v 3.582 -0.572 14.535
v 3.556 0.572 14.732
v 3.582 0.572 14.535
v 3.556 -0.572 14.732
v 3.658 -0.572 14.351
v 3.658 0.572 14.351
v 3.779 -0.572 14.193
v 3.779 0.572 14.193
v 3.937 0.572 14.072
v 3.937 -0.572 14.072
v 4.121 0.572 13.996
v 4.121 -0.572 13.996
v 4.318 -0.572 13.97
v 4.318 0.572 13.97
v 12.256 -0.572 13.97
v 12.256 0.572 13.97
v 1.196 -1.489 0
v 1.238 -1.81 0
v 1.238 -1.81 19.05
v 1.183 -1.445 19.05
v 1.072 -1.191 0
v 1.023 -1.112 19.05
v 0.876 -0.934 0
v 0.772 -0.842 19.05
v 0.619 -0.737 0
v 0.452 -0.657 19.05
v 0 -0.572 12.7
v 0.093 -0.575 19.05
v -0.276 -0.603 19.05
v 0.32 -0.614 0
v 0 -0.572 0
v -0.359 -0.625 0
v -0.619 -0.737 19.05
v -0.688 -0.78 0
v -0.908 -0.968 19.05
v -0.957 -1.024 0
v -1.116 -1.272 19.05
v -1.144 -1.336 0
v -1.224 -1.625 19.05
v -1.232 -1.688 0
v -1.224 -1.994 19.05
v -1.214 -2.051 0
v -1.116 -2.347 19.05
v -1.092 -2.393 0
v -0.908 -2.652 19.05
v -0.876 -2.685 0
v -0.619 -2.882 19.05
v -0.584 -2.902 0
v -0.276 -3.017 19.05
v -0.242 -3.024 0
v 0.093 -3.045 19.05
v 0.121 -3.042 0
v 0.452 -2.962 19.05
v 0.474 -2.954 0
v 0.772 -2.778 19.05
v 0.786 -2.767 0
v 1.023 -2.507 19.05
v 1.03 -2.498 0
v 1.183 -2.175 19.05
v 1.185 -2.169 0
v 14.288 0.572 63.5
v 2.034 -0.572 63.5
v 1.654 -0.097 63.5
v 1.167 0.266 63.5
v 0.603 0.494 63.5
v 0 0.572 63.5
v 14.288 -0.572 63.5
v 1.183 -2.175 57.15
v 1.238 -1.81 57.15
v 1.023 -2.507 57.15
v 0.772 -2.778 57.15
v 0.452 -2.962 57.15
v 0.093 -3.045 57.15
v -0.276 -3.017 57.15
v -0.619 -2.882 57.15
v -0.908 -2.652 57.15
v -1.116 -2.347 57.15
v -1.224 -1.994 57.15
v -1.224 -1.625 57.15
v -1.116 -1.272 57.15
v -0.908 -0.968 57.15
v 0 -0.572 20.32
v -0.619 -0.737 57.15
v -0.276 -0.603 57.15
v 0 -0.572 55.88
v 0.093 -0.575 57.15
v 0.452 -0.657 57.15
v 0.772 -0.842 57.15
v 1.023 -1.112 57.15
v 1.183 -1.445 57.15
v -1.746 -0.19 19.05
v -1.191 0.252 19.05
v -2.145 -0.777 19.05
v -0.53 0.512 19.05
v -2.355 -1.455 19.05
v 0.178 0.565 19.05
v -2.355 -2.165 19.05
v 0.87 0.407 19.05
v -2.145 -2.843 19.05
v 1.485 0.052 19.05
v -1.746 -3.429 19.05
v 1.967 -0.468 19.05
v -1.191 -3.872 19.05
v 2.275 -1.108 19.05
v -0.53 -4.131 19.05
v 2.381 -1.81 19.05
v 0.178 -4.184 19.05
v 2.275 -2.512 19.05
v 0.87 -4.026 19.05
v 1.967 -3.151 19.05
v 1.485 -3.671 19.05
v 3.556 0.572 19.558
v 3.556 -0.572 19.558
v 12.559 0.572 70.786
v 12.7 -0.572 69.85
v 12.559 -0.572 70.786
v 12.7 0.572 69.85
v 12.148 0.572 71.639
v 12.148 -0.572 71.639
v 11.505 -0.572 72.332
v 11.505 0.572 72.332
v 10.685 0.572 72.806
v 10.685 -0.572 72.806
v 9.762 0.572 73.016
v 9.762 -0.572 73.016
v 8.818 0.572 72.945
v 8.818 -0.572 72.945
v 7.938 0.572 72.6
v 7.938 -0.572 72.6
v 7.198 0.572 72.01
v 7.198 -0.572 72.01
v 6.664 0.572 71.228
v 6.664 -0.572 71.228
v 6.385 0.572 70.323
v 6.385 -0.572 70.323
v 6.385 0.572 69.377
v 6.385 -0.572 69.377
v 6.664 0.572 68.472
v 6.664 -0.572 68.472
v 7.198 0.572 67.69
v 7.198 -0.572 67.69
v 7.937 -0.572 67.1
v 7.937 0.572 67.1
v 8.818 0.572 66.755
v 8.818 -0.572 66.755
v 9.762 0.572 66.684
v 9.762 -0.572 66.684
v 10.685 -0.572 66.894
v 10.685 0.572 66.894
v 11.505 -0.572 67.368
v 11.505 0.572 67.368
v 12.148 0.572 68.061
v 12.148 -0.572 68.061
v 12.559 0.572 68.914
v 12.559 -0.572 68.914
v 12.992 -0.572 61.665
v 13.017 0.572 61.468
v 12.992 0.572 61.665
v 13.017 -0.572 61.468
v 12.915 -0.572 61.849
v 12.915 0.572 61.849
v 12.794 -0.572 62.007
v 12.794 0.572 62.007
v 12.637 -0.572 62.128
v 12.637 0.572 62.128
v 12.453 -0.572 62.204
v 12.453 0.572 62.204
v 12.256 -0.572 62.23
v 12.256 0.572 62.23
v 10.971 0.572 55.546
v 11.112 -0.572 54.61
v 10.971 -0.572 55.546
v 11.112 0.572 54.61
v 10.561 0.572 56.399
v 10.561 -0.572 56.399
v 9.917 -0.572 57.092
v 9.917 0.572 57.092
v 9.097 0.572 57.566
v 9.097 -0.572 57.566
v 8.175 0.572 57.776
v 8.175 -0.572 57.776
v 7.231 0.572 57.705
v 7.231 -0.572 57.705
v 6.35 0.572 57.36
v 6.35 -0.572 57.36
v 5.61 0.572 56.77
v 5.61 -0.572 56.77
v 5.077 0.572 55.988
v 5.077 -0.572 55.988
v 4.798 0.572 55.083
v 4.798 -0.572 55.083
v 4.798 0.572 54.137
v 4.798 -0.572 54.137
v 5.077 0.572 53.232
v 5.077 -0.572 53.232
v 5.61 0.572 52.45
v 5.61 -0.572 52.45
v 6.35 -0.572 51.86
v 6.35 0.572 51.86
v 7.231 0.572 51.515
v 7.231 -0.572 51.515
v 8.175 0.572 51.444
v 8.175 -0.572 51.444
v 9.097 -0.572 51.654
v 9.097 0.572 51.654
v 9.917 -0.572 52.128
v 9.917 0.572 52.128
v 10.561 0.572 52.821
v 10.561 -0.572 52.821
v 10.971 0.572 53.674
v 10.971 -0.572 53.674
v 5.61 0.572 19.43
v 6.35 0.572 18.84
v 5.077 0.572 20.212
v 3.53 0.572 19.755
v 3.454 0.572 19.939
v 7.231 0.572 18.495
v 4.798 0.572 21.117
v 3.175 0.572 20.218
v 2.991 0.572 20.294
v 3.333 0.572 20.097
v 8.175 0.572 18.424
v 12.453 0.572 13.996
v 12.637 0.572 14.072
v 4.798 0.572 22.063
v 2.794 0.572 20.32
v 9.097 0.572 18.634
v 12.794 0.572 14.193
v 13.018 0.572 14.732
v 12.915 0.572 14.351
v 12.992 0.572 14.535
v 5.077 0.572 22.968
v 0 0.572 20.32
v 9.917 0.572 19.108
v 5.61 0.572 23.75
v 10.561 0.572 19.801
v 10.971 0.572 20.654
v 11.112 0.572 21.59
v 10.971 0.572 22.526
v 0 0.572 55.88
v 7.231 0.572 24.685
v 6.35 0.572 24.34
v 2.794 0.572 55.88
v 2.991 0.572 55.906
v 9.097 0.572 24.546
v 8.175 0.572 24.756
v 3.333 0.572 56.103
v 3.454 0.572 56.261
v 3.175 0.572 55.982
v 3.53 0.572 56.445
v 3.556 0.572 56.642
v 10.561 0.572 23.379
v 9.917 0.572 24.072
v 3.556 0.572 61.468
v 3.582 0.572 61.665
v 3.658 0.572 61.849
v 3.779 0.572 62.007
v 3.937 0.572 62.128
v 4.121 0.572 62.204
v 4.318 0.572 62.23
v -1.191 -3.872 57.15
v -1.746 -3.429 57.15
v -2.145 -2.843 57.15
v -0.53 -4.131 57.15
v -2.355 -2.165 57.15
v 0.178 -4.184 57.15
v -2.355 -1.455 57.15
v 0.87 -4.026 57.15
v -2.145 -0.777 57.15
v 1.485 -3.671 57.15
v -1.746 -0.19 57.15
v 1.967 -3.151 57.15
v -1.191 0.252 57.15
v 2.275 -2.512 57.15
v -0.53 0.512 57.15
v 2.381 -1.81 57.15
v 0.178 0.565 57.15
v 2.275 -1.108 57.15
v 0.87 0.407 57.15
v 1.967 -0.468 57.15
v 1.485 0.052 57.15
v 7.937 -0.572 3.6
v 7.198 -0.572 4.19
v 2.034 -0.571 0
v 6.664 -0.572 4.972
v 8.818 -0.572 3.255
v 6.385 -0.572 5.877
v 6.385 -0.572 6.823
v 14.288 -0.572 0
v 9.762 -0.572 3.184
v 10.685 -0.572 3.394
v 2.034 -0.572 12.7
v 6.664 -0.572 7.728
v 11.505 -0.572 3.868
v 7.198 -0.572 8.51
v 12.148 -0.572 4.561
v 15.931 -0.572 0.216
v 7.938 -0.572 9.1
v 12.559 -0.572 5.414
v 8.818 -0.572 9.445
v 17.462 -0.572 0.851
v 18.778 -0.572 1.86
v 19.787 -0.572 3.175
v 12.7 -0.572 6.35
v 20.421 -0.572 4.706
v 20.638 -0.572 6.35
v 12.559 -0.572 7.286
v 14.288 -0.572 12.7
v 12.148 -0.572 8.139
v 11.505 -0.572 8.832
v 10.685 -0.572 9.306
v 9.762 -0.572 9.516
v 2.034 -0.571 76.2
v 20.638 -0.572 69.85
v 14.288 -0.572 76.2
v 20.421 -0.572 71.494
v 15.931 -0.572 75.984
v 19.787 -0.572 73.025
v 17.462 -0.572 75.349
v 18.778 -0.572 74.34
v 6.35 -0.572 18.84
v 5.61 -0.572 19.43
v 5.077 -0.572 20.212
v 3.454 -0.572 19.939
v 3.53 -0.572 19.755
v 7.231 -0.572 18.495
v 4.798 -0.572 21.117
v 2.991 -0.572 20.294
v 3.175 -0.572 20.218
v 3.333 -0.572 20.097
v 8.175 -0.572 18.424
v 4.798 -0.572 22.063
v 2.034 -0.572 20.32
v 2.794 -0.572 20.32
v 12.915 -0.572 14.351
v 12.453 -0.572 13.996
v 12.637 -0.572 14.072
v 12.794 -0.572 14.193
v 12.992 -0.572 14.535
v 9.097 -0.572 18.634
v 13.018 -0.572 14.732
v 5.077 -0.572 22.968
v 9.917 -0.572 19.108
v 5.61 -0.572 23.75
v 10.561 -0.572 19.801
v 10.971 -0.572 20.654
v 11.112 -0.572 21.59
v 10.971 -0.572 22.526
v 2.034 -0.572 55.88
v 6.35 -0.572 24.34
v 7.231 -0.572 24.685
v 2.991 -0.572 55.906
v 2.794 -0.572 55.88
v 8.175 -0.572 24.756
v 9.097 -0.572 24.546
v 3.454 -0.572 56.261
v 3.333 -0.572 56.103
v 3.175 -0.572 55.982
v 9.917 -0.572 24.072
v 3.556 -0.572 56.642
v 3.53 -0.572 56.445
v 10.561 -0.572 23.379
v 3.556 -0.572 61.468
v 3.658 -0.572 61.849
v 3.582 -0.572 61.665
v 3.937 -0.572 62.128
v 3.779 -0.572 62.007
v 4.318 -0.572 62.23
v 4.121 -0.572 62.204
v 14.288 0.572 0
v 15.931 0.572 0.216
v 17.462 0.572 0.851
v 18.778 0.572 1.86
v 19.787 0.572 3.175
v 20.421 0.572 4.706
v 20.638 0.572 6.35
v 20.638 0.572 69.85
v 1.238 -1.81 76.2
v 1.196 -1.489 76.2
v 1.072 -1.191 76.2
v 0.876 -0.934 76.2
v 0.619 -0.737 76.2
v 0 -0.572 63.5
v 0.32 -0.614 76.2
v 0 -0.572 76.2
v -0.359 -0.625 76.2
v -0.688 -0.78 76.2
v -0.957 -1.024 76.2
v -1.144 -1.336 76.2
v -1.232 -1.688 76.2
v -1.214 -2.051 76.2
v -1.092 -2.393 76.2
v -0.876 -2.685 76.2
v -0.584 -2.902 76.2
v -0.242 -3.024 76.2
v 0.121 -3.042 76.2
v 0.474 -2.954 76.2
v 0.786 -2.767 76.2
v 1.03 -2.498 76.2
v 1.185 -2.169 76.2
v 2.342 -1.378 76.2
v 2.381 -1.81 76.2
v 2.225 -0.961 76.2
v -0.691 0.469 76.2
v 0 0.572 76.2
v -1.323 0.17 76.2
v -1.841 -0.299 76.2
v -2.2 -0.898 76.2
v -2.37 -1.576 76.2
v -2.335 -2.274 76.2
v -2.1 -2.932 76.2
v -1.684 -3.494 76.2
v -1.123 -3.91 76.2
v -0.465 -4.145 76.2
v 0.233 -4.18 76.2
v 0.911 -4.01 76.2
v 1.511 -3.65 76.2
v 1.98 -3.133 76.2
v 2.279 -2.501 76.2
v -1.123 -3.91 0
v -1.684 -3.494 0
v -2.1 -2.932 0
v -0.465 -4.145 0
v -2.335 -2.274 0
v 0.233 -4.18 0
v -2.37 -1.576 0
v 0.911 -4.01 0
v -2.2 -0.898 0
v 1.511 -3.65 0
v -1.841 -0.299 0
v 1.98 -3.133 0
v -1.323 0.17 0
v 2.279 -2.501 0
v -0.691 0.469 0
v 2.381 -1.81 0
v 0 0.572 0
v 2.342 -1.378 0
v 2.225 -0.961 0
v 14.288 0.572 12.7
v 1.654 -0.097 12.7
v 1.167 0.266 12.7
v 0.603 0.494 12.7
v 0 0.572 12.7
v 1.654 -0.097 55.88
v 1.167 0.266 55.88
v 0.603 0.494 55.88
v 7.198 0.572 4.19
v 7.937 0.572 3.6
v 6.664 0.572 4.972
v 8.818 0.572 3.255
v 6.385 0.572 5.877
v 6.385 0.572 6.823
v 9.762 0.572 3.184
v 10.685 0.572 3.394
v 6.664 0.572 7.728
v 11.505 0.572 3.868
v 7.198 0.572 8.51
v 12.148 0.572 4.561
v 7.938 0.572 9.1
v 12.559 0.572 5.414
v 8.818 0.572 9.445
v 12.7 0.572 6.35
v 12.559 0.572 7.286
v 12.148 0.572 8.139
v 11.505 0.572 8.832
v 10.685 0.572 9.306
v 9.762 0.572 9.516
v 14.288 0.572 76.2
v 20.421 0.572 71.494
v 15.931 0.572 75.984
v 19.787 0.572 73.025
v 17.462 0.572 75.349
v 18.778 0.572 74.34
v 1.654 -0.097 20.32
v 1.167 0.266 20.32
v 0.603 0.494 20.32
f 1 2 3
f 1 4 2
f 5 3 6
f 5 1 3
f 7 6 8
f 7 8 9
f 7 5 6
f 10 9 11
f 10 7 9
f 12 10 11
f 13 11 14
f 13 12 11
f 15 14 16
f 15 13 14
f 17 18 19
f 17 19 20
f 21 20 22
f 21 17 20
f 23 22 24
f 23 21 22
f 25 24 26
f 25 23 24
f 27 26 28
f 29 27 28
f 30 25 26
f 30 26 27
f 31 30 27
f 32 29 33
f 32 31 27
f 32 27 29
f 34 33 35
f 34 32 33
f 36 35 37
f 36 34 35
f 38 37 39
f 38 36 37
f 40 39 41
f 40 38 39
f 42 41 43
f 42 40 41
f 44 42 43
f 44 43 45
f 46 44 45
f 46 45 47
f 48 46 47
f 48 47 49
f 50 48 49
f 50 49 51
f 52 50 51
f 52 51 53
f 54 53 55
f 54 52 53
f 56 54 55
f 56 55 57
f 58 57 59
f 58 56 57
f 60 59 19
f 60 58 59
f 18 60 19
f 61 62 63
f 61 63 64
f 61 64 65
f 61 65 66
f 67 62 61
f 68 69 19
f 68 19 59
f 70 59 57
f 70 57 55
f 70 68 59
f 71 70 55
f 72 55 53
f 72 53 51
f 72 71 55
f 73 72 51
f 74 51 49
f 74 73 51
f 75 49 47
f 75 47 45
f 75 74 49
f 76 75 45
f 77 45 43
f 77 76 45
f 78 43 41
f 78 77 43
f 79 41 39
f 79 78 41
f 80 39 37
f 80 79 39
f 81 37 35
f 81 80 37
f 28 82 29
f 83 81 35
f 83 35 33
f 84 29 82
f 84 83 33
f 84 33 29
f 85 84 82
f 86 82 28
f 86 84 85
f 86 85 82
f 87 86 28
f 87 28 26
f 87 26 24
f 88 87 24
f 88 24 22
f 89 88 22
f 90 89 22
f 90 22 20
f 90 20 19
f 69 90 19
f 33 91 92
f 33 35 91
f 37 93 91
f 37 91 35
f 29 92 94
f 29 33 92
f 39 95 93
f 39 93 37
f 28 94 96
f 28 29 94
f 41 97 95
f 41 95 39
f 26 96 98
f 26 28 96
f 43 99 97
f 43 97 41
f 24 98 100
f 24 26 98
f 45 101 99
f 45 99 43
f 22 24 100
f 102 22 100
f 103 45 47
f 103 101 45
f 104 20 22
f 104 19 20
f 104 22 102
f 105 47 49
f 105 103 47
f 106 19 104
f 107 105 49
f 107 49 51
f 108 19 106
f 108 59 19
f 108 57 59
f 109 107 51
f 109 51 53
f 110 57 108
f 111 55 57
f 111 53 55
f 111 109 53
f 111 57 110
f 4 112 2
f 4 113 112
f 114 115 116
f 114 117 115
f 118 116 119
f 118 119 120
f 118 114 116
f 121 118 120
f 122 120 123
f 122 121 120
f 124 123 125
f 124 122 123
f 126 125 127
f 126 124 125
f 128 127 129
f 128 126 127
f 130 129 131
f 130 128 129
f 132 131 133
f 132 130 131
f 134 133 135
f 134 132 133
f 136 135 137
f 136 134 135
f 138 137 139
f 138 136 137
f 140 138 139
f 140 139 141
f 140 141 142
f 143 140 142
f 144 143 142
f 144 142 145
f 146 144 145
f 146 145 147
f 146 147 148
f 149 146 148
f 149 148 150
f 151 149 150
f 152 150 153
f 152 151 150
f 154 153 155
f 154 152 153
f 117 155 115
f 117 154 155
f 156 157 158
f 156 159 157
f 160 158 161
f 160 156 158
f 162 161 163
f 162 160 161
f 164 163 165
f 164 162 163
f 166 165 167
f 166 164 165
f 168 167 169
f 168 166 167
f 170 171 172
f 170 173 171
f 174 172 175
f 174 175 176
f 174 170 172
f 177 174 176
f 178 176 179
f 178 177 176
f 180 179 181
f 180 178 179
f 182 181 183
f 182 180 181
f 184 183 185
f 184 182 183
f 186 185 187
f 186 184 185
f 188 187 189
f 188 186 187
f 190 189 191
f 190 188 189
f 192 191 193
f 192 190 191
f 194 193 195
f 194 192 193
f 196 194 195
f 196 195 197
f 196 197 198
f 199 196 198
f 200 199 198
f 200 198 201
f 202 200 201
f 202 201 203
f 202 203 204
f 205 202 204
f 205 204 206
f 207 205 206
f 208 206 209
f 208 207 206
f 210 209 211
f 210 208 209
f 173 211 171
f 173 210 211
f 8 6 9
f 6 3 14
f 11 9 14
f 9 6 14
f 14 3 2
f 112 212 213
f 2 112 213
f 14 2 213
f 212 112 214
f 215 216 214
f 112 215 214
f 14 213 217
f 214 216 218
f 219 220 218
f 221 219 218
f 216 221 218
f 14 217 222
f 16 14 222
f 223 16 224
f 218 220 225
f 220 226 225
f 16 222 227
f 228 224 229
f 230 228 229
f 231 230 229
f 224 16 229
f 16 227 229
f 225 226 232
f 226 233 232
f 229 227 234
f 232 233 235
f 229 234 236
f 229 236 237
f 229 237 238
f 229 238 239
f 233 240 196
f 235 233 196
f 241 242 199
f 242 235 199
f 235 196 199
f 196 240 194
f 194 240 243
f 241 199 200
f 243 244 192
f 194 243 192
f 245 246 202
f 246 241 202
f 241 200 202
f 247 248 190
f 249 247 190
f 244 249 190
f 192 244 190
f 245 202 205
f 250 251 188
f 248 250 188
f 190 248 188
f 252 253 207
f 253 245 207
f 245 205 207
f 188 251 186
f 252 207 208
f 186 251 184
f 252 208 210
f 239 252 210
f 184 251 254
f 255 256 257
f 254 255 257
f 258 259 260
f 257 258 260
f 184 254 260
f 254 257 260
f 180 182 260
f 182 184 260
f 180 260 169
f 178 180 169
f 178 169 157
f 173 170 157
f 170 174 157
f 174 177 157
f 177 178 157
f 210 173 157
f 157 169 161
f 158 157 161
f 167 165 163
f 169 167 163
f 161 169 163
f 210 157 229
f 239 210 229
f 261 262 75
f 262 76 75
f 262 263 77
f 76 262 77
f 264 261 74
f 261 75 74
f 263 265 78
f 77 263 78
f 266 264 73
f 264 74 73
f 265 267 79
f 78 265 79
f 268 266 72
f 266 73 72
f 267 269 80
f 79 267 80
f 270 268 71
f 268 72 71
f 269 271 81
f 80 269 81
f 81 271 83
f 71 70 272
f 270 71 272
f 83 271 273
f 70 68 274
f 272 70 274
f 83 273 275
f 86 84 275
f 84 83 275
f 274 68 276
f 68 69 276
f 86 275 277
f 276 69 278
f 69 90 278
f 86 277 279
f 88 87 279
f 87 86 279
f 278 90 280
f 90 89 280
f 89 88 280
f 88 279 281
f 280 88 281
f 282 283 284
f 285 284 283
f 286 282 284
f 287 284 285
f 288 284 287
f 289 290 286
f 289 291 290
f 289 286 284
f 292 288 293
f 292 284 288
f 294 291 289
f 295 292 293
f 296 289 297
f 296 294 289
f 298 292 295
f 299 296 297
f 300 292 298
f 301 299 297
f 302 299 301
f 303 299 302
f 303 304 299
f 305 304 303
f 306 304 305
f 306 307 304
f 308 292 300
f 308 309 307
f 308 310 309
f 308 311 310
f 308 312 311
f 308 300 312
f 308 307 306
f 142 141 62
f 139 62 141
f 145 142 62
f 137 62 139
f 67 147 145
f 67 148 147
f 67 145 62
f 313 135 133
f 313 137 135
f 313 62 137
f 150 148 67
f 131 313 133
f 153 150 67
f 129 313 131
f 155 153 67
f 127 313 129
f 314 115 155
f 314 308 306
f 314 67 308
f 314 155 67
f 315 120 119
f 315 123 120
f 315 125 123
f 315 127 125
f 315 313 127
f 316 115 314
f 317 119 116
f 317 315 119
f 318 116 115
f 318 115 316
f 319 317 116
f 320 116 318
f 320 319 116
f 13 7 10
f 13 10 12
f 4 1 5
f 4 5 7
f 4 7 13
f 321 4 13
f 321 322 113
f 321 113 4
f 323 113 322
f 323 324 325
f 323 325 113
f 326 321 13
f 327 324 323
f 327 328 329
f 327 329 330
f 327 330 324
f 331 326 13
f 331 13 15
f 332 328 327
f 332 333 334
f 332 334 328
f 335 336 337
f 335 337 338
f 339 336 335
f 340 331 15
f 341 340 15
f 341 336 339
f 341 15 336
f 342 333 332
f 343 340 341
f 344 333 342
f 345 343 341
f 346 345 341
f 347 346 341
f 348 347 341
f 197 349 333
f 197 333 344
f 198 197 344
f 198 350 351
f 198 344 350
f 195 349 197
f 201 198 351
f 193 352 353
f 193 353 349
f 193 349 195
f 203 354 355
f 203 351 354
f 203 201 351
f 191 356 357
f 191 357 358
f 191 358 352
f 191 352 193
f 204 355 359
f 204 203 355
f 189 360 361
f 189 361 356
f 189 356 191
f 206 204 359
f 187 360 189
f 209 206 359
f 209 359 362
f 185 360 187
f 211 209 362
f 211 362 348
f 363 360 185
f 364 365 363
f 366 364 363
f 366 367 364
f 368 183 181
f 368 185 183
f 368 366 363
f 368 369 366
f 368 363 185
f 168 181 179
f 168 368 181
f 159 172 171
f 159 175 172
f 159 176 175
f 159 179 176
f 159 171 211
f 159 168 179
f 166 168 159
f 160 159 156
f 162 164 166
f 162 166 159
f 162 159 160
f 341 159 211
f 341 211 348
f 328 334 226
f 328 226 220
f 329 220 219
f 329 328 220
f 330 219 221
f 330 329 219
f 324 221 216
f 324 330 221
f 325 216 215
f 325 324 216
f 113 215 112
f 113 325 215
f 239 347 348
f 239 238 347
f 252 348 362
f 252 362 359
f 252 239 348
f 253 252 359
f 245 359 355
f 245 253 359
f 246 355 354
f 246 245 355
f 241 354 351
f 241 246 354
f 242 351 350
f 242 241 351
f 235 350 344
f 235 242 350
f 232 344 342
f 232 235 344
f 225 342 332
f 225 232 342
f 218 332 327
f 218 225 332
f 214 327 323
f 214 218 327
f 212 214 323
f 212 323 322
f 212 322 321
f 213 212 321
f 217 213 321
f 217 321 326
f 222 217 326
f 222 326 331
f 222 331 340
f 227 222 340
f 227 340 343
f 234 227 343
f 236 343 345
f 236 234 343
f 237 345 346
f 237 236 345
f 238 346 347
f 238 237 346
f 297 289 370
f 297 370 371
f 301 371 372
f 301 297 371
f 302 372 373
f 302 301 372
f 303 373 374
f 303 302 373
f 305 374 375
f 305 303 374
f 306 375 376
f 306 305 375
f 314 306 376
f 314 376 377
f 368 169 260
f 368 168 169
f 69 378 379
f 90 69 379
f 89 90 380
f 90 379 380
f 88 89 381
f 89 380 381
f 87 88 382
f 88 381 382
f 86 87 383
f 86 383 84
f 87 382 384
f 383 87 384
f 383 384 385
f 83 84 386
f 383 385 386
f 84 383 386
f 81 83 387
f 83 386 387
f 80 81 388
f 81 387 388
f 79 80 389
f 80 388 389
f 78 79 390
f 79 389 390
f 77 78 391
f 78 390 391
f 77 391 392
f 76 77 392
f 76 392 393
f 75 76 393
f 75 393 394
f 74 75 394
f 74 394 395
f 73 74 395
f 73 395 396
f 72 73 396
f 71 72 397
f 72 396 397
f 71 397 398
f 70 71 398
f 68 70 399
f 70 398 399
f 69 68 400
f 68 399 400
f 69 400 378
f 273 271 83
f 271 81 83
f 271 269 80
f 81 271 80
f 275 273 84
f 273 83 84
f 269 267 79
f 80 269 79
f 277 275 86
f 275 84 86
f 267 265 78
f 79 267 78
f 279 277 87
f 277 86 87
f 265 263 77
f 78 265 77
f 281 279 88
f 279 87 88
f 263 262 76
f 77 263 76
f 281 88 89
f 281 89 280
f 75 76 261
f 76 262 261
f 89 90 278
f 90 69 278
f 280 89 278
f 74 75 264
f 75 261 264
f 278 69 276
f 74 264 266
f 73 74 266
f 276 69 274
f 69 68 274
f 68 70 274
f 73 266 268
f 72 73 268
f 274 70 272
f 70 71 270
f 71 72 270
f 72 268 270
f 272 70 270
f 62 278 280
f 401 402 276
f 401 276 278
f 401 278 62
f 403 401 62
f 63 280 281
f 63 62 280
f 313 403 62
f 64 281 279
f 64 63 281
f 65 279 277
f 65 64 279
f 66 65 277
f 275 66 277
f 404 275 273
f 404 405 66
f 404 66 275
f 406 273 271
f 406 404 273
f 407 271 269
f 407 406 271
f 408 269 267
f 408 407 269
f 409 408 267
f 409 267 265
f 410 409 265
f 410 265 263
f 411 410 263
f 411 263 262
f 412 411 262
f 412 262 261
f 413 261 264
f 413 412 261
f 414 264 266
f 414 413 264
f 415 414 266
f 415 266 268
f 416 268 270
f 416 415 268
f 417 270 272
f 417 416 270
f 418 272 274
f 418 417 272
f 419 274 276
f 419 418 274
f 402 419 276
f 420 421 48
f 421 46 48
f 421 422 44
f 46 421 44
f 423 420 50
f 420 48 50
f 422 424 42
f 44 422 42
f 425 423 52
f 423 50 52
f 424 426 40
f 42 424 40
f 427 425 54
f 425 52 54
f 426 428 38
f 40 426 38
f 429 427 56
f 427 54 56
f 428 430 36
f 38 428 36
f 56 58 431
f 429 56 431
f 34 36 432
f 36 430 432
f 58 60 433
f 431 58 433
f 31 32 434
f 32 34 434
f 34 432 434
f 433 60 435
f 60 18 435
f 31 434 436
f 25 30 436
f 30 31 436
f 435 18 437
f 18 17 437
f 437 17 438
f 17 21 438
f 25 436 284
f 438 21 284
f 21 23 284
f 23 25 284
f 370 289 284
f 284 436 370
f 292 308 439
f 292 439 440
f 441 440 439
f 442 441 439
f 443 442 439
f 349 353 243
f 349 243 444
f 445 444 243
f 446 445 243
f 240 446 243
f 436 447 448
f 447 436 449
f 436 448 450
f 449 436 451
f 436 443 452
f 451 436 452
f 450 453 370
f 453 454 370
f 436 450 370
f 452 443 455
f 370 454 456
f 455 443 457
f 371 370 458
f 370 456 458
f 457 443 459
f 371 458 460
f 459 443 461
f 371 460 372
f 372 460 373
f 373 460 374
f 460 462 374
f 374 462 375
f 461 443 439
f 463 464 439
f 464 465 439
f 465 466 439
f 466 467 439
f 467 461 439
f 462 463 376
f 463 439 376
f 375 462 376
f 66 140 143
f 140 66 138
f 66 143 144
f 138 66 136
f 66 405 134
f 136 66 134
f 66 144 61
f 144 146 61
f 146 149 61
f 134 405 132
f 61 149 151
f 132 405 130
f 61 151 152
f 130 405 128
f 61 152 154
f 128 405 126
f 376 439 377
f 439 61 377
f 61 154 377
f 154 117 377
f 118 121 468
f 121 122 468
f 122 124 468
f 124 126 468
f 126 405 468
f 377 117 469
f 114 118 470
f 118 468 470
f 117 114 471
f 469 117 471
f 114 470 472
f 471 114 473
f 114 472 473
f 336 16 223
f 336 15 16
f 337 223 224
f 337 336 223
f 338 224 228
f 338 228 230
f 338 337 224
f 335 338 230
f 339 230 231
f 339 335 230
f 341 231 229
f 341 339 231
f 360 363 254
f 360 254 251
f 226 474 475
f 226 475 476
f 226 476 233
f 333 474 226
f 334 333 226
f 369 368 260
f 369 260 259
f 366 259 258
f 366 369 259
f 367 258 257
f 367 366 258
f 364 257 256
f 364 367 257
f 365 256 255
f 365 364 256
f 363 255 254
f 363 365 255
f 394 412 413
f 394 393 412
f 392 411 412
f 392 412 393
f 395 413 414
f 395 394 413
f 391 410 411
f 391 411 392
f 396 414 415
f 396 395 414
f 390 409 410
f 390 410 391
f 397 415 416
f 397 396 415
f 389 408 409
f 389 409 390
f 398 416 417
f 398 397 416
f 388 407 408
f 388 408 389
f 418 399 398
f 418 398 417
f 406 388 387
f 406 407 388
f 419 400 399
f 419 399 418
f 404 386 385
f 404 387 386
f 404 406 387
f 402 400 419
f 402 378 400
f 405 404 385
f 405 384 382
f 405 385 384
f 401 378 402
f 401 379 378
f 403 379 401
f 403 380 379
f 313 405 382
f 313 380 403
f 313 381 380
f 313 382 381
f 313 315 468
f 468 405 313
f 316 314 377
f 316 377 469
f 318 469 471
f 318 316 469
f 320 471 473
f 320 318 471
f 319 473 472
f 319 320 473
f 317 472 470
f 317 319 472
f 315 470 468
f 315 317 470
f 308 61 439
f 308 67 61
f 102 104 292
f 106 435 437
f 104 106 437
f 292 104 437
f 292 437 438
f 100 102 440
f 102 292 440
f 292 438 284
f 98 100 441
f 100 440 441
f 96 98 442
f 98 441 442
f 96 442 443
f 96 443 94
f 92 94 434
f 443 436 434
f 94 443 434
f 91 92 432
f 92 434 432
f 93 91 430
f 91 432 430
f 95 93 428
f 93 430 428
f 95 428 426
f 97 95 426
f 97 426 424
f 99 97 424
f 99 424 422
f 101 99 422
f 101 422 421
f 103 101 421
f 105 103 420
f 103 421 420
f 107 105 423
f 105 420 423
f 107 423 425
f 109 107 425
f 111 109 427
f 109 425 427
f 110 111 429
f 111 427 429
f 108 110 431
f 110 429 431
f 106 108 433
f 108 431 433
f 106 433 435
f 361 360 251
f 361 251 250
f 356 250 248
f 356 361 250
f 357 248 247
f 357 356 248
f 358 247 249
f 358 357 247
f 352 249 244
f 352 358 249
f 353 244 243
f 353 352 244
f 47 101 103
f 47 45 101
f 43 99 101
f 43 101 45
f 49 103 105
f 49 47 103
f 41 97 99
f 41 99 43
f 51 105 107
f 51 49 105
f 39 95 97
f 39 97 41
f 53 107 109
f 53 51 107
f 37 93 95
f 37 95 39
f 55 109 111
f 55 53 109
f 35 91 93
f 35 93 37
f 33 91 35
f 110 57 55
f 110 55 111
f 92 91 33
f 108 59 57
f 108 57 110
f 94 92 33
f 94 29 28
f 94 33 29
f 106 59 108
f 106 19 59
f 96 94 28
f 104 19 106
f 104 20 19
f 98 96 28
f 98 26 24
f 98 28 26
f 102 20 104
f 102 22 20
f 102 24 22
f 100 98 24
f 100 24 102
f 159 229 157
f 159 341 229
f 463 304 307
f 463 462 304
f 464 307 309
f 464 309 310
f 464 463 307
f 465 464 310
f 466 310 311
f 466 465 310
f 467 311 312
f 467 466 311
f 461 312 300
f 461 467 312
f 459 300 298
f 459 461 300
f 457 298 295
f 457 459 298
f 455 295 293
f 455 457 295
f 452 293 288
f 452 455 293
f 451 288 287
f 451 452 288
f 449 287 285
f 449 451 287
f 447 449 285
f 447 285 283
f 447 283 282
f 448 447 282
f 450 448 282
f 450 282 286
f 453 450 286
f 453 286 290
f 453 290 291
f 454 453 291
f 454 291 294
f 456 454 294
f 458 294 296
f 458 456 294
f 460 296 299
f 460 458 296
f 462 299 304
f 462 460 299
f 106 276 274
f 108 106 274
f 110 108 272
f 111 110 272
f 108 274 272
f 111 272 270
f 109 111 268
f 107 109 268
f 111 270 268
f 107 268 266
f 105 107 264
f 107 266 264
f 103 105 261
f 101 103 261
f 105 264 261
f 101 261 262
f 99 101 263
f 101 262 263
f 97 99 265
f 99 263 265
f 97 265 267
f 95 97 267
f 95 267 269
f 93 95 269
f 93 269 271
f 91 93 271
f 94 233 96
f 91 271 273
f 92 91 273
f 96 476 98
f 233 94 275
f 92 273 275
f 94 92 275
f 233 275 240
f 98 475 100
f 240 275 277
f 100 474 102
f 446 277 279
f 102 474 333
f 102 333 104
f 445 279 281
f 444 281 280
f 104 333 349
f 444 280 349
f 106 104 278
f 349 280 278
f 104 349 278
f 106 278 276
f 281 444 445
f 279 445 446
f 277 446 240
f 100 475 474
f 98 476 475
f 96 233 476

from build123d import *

# Parameters (mm, degrees)
F1_R     = 3.175
F2_DEPTH = 0.5715
F3_R     = 2.38125
F3_R_2   = 1.23825
F4_DEPTH = 19.05
F6_R     = 2.38125
F6_R_2   = 1.23825
F7_DEPTH = 38.1
F8_R     = 3.175
F9_DEPTH = 0.5715


# Not quite as in the source:
# - a pattern or mirror of a feature is missing from the dataset's text; its kind, count and spacing are read off the source's solid


with BuildPart() as f2:
    # F1 (on Front) → F2 (new body, symmetric)
    with BuildSketch(Plane.XZ):
        with BuildLine():
            Line((0, 12.7), (0, 0))
            Line((0, 0), (14.2875, 0))
            ThreePointArc((14.2875, 0), (18.7776280605, 1.8598719395), (20.6375, 6.35))
            Line((20.6375, 6.35), (20.6375, 69.85))
            ThreePointArc((20.6375, 69.85), (18.7776280605, 74.3401280605), (14.2875, 76.2))
            Line((14.2875, 76.2), (0, 76.2))
            Line((0, 76.2), (0, 63.5))
            Line((0, 63.5), (14.2875, 63.5))
            Line((14.2875, 63.5), (14.2875, 12.7))
            Line((14.2875, 12.7), (0, 12.7))
        make_face()
        with Locations((9.525, 6.35)):
            Circle(F1_R, mode=Mode.SUBTRACT)
        with Locations((9.525, 69.85)):
            Circle(F1_R, mode=Mode.SUBTRACT)
    extrude(amount=F2_DEPTH, both=True)

    # F3 (on face) → F4 (join)
    with BuildSketch(Plane.XY.offset(76.2)):
        with Locations((0, -1.80975)):
            Circle(F3_R)
        with Locations((0, -1.80975)):
            Circle(F3_R_2, mode=Mode.SUBTRACT)
    f4 = extrude(amount=-F4_DEPTH)

    # F4_copies: F4 across plane
    add(f4.mirror(Plane(origin=(0, 0, 38.1), x_dir=(-1, 0, 0), z_dir=(0, 0, -1))))


with BuildPart() as f7:
    # F6 (on face) → F7 (new body)
    with BuildSketch(Plane(origin=(0, 0, 57.15), x_dir=(1, 0, 0), z_dir=(0, 0, -1))):
        with Locations((0, 1.80975)):
            Circle(F6_R)
        with Locations((0, 1.80975)):
            Circle(F6_R_2, mode=Mode.SUBTRACT)
    extrude(amount=F7_DEPTH)

    # F8 (on Front) → F9 (join, symmetric)
    with BuildSketch(Plane.XZ):
        with BuildLine():
            Line((12.2555, 62.23), (4.318, 62.23))
            ThreePointArc((4.318, 62.23), (3.7791846327, 62.0068153673), (3.556, 61.468))
            Line((3.556, 61.468), (3.556, 56.642))
            ThreePointArc((3.556, 56.642), (3.3328153673, 56.1031846327), (2.794, 55.88))
            Line((2.794, 55.88), (0, 55.88))
            Line((0, 55.88), (0, 20.32))
            Line((0, 20.32), (2.794, 20.32))
            ThreePointArc((2.794, 20.32), (3.3328153673, 20.0968153673), (3.556, 19.558))
            Line((3.556, 19.558), (3.556, 14.732))
            ThreePointArc((3.556, 14.732), (3.7791846327, 14.1931846327), (4.318, 13.97))
            Line((4.318, 13.97), (12.2555, 13.97))
            ThreePointArc((12.2555, 13.97), (12.7943153673, 14.1931846327), (13.0175, 14.732))
            Line((13.0175, 14.732), (13.0175, 61.468))
            ThreePointArc((13.0175, 61.468), (12.7943153673, 62.0068153673), (12.2555, 62.23))
        make_face()
        with Locations((7.9375, 21.59)):
            Circle(F8_R, mode=Mode.SUBTRACT)
        with Locations((7.9375, 54.61)):
            Circle(F8_R, mode=Mode.SUBTRACT)
    extrude(amount=F9_DEPTH, both=True)


solid = Compound([f2.part, f7.part])
